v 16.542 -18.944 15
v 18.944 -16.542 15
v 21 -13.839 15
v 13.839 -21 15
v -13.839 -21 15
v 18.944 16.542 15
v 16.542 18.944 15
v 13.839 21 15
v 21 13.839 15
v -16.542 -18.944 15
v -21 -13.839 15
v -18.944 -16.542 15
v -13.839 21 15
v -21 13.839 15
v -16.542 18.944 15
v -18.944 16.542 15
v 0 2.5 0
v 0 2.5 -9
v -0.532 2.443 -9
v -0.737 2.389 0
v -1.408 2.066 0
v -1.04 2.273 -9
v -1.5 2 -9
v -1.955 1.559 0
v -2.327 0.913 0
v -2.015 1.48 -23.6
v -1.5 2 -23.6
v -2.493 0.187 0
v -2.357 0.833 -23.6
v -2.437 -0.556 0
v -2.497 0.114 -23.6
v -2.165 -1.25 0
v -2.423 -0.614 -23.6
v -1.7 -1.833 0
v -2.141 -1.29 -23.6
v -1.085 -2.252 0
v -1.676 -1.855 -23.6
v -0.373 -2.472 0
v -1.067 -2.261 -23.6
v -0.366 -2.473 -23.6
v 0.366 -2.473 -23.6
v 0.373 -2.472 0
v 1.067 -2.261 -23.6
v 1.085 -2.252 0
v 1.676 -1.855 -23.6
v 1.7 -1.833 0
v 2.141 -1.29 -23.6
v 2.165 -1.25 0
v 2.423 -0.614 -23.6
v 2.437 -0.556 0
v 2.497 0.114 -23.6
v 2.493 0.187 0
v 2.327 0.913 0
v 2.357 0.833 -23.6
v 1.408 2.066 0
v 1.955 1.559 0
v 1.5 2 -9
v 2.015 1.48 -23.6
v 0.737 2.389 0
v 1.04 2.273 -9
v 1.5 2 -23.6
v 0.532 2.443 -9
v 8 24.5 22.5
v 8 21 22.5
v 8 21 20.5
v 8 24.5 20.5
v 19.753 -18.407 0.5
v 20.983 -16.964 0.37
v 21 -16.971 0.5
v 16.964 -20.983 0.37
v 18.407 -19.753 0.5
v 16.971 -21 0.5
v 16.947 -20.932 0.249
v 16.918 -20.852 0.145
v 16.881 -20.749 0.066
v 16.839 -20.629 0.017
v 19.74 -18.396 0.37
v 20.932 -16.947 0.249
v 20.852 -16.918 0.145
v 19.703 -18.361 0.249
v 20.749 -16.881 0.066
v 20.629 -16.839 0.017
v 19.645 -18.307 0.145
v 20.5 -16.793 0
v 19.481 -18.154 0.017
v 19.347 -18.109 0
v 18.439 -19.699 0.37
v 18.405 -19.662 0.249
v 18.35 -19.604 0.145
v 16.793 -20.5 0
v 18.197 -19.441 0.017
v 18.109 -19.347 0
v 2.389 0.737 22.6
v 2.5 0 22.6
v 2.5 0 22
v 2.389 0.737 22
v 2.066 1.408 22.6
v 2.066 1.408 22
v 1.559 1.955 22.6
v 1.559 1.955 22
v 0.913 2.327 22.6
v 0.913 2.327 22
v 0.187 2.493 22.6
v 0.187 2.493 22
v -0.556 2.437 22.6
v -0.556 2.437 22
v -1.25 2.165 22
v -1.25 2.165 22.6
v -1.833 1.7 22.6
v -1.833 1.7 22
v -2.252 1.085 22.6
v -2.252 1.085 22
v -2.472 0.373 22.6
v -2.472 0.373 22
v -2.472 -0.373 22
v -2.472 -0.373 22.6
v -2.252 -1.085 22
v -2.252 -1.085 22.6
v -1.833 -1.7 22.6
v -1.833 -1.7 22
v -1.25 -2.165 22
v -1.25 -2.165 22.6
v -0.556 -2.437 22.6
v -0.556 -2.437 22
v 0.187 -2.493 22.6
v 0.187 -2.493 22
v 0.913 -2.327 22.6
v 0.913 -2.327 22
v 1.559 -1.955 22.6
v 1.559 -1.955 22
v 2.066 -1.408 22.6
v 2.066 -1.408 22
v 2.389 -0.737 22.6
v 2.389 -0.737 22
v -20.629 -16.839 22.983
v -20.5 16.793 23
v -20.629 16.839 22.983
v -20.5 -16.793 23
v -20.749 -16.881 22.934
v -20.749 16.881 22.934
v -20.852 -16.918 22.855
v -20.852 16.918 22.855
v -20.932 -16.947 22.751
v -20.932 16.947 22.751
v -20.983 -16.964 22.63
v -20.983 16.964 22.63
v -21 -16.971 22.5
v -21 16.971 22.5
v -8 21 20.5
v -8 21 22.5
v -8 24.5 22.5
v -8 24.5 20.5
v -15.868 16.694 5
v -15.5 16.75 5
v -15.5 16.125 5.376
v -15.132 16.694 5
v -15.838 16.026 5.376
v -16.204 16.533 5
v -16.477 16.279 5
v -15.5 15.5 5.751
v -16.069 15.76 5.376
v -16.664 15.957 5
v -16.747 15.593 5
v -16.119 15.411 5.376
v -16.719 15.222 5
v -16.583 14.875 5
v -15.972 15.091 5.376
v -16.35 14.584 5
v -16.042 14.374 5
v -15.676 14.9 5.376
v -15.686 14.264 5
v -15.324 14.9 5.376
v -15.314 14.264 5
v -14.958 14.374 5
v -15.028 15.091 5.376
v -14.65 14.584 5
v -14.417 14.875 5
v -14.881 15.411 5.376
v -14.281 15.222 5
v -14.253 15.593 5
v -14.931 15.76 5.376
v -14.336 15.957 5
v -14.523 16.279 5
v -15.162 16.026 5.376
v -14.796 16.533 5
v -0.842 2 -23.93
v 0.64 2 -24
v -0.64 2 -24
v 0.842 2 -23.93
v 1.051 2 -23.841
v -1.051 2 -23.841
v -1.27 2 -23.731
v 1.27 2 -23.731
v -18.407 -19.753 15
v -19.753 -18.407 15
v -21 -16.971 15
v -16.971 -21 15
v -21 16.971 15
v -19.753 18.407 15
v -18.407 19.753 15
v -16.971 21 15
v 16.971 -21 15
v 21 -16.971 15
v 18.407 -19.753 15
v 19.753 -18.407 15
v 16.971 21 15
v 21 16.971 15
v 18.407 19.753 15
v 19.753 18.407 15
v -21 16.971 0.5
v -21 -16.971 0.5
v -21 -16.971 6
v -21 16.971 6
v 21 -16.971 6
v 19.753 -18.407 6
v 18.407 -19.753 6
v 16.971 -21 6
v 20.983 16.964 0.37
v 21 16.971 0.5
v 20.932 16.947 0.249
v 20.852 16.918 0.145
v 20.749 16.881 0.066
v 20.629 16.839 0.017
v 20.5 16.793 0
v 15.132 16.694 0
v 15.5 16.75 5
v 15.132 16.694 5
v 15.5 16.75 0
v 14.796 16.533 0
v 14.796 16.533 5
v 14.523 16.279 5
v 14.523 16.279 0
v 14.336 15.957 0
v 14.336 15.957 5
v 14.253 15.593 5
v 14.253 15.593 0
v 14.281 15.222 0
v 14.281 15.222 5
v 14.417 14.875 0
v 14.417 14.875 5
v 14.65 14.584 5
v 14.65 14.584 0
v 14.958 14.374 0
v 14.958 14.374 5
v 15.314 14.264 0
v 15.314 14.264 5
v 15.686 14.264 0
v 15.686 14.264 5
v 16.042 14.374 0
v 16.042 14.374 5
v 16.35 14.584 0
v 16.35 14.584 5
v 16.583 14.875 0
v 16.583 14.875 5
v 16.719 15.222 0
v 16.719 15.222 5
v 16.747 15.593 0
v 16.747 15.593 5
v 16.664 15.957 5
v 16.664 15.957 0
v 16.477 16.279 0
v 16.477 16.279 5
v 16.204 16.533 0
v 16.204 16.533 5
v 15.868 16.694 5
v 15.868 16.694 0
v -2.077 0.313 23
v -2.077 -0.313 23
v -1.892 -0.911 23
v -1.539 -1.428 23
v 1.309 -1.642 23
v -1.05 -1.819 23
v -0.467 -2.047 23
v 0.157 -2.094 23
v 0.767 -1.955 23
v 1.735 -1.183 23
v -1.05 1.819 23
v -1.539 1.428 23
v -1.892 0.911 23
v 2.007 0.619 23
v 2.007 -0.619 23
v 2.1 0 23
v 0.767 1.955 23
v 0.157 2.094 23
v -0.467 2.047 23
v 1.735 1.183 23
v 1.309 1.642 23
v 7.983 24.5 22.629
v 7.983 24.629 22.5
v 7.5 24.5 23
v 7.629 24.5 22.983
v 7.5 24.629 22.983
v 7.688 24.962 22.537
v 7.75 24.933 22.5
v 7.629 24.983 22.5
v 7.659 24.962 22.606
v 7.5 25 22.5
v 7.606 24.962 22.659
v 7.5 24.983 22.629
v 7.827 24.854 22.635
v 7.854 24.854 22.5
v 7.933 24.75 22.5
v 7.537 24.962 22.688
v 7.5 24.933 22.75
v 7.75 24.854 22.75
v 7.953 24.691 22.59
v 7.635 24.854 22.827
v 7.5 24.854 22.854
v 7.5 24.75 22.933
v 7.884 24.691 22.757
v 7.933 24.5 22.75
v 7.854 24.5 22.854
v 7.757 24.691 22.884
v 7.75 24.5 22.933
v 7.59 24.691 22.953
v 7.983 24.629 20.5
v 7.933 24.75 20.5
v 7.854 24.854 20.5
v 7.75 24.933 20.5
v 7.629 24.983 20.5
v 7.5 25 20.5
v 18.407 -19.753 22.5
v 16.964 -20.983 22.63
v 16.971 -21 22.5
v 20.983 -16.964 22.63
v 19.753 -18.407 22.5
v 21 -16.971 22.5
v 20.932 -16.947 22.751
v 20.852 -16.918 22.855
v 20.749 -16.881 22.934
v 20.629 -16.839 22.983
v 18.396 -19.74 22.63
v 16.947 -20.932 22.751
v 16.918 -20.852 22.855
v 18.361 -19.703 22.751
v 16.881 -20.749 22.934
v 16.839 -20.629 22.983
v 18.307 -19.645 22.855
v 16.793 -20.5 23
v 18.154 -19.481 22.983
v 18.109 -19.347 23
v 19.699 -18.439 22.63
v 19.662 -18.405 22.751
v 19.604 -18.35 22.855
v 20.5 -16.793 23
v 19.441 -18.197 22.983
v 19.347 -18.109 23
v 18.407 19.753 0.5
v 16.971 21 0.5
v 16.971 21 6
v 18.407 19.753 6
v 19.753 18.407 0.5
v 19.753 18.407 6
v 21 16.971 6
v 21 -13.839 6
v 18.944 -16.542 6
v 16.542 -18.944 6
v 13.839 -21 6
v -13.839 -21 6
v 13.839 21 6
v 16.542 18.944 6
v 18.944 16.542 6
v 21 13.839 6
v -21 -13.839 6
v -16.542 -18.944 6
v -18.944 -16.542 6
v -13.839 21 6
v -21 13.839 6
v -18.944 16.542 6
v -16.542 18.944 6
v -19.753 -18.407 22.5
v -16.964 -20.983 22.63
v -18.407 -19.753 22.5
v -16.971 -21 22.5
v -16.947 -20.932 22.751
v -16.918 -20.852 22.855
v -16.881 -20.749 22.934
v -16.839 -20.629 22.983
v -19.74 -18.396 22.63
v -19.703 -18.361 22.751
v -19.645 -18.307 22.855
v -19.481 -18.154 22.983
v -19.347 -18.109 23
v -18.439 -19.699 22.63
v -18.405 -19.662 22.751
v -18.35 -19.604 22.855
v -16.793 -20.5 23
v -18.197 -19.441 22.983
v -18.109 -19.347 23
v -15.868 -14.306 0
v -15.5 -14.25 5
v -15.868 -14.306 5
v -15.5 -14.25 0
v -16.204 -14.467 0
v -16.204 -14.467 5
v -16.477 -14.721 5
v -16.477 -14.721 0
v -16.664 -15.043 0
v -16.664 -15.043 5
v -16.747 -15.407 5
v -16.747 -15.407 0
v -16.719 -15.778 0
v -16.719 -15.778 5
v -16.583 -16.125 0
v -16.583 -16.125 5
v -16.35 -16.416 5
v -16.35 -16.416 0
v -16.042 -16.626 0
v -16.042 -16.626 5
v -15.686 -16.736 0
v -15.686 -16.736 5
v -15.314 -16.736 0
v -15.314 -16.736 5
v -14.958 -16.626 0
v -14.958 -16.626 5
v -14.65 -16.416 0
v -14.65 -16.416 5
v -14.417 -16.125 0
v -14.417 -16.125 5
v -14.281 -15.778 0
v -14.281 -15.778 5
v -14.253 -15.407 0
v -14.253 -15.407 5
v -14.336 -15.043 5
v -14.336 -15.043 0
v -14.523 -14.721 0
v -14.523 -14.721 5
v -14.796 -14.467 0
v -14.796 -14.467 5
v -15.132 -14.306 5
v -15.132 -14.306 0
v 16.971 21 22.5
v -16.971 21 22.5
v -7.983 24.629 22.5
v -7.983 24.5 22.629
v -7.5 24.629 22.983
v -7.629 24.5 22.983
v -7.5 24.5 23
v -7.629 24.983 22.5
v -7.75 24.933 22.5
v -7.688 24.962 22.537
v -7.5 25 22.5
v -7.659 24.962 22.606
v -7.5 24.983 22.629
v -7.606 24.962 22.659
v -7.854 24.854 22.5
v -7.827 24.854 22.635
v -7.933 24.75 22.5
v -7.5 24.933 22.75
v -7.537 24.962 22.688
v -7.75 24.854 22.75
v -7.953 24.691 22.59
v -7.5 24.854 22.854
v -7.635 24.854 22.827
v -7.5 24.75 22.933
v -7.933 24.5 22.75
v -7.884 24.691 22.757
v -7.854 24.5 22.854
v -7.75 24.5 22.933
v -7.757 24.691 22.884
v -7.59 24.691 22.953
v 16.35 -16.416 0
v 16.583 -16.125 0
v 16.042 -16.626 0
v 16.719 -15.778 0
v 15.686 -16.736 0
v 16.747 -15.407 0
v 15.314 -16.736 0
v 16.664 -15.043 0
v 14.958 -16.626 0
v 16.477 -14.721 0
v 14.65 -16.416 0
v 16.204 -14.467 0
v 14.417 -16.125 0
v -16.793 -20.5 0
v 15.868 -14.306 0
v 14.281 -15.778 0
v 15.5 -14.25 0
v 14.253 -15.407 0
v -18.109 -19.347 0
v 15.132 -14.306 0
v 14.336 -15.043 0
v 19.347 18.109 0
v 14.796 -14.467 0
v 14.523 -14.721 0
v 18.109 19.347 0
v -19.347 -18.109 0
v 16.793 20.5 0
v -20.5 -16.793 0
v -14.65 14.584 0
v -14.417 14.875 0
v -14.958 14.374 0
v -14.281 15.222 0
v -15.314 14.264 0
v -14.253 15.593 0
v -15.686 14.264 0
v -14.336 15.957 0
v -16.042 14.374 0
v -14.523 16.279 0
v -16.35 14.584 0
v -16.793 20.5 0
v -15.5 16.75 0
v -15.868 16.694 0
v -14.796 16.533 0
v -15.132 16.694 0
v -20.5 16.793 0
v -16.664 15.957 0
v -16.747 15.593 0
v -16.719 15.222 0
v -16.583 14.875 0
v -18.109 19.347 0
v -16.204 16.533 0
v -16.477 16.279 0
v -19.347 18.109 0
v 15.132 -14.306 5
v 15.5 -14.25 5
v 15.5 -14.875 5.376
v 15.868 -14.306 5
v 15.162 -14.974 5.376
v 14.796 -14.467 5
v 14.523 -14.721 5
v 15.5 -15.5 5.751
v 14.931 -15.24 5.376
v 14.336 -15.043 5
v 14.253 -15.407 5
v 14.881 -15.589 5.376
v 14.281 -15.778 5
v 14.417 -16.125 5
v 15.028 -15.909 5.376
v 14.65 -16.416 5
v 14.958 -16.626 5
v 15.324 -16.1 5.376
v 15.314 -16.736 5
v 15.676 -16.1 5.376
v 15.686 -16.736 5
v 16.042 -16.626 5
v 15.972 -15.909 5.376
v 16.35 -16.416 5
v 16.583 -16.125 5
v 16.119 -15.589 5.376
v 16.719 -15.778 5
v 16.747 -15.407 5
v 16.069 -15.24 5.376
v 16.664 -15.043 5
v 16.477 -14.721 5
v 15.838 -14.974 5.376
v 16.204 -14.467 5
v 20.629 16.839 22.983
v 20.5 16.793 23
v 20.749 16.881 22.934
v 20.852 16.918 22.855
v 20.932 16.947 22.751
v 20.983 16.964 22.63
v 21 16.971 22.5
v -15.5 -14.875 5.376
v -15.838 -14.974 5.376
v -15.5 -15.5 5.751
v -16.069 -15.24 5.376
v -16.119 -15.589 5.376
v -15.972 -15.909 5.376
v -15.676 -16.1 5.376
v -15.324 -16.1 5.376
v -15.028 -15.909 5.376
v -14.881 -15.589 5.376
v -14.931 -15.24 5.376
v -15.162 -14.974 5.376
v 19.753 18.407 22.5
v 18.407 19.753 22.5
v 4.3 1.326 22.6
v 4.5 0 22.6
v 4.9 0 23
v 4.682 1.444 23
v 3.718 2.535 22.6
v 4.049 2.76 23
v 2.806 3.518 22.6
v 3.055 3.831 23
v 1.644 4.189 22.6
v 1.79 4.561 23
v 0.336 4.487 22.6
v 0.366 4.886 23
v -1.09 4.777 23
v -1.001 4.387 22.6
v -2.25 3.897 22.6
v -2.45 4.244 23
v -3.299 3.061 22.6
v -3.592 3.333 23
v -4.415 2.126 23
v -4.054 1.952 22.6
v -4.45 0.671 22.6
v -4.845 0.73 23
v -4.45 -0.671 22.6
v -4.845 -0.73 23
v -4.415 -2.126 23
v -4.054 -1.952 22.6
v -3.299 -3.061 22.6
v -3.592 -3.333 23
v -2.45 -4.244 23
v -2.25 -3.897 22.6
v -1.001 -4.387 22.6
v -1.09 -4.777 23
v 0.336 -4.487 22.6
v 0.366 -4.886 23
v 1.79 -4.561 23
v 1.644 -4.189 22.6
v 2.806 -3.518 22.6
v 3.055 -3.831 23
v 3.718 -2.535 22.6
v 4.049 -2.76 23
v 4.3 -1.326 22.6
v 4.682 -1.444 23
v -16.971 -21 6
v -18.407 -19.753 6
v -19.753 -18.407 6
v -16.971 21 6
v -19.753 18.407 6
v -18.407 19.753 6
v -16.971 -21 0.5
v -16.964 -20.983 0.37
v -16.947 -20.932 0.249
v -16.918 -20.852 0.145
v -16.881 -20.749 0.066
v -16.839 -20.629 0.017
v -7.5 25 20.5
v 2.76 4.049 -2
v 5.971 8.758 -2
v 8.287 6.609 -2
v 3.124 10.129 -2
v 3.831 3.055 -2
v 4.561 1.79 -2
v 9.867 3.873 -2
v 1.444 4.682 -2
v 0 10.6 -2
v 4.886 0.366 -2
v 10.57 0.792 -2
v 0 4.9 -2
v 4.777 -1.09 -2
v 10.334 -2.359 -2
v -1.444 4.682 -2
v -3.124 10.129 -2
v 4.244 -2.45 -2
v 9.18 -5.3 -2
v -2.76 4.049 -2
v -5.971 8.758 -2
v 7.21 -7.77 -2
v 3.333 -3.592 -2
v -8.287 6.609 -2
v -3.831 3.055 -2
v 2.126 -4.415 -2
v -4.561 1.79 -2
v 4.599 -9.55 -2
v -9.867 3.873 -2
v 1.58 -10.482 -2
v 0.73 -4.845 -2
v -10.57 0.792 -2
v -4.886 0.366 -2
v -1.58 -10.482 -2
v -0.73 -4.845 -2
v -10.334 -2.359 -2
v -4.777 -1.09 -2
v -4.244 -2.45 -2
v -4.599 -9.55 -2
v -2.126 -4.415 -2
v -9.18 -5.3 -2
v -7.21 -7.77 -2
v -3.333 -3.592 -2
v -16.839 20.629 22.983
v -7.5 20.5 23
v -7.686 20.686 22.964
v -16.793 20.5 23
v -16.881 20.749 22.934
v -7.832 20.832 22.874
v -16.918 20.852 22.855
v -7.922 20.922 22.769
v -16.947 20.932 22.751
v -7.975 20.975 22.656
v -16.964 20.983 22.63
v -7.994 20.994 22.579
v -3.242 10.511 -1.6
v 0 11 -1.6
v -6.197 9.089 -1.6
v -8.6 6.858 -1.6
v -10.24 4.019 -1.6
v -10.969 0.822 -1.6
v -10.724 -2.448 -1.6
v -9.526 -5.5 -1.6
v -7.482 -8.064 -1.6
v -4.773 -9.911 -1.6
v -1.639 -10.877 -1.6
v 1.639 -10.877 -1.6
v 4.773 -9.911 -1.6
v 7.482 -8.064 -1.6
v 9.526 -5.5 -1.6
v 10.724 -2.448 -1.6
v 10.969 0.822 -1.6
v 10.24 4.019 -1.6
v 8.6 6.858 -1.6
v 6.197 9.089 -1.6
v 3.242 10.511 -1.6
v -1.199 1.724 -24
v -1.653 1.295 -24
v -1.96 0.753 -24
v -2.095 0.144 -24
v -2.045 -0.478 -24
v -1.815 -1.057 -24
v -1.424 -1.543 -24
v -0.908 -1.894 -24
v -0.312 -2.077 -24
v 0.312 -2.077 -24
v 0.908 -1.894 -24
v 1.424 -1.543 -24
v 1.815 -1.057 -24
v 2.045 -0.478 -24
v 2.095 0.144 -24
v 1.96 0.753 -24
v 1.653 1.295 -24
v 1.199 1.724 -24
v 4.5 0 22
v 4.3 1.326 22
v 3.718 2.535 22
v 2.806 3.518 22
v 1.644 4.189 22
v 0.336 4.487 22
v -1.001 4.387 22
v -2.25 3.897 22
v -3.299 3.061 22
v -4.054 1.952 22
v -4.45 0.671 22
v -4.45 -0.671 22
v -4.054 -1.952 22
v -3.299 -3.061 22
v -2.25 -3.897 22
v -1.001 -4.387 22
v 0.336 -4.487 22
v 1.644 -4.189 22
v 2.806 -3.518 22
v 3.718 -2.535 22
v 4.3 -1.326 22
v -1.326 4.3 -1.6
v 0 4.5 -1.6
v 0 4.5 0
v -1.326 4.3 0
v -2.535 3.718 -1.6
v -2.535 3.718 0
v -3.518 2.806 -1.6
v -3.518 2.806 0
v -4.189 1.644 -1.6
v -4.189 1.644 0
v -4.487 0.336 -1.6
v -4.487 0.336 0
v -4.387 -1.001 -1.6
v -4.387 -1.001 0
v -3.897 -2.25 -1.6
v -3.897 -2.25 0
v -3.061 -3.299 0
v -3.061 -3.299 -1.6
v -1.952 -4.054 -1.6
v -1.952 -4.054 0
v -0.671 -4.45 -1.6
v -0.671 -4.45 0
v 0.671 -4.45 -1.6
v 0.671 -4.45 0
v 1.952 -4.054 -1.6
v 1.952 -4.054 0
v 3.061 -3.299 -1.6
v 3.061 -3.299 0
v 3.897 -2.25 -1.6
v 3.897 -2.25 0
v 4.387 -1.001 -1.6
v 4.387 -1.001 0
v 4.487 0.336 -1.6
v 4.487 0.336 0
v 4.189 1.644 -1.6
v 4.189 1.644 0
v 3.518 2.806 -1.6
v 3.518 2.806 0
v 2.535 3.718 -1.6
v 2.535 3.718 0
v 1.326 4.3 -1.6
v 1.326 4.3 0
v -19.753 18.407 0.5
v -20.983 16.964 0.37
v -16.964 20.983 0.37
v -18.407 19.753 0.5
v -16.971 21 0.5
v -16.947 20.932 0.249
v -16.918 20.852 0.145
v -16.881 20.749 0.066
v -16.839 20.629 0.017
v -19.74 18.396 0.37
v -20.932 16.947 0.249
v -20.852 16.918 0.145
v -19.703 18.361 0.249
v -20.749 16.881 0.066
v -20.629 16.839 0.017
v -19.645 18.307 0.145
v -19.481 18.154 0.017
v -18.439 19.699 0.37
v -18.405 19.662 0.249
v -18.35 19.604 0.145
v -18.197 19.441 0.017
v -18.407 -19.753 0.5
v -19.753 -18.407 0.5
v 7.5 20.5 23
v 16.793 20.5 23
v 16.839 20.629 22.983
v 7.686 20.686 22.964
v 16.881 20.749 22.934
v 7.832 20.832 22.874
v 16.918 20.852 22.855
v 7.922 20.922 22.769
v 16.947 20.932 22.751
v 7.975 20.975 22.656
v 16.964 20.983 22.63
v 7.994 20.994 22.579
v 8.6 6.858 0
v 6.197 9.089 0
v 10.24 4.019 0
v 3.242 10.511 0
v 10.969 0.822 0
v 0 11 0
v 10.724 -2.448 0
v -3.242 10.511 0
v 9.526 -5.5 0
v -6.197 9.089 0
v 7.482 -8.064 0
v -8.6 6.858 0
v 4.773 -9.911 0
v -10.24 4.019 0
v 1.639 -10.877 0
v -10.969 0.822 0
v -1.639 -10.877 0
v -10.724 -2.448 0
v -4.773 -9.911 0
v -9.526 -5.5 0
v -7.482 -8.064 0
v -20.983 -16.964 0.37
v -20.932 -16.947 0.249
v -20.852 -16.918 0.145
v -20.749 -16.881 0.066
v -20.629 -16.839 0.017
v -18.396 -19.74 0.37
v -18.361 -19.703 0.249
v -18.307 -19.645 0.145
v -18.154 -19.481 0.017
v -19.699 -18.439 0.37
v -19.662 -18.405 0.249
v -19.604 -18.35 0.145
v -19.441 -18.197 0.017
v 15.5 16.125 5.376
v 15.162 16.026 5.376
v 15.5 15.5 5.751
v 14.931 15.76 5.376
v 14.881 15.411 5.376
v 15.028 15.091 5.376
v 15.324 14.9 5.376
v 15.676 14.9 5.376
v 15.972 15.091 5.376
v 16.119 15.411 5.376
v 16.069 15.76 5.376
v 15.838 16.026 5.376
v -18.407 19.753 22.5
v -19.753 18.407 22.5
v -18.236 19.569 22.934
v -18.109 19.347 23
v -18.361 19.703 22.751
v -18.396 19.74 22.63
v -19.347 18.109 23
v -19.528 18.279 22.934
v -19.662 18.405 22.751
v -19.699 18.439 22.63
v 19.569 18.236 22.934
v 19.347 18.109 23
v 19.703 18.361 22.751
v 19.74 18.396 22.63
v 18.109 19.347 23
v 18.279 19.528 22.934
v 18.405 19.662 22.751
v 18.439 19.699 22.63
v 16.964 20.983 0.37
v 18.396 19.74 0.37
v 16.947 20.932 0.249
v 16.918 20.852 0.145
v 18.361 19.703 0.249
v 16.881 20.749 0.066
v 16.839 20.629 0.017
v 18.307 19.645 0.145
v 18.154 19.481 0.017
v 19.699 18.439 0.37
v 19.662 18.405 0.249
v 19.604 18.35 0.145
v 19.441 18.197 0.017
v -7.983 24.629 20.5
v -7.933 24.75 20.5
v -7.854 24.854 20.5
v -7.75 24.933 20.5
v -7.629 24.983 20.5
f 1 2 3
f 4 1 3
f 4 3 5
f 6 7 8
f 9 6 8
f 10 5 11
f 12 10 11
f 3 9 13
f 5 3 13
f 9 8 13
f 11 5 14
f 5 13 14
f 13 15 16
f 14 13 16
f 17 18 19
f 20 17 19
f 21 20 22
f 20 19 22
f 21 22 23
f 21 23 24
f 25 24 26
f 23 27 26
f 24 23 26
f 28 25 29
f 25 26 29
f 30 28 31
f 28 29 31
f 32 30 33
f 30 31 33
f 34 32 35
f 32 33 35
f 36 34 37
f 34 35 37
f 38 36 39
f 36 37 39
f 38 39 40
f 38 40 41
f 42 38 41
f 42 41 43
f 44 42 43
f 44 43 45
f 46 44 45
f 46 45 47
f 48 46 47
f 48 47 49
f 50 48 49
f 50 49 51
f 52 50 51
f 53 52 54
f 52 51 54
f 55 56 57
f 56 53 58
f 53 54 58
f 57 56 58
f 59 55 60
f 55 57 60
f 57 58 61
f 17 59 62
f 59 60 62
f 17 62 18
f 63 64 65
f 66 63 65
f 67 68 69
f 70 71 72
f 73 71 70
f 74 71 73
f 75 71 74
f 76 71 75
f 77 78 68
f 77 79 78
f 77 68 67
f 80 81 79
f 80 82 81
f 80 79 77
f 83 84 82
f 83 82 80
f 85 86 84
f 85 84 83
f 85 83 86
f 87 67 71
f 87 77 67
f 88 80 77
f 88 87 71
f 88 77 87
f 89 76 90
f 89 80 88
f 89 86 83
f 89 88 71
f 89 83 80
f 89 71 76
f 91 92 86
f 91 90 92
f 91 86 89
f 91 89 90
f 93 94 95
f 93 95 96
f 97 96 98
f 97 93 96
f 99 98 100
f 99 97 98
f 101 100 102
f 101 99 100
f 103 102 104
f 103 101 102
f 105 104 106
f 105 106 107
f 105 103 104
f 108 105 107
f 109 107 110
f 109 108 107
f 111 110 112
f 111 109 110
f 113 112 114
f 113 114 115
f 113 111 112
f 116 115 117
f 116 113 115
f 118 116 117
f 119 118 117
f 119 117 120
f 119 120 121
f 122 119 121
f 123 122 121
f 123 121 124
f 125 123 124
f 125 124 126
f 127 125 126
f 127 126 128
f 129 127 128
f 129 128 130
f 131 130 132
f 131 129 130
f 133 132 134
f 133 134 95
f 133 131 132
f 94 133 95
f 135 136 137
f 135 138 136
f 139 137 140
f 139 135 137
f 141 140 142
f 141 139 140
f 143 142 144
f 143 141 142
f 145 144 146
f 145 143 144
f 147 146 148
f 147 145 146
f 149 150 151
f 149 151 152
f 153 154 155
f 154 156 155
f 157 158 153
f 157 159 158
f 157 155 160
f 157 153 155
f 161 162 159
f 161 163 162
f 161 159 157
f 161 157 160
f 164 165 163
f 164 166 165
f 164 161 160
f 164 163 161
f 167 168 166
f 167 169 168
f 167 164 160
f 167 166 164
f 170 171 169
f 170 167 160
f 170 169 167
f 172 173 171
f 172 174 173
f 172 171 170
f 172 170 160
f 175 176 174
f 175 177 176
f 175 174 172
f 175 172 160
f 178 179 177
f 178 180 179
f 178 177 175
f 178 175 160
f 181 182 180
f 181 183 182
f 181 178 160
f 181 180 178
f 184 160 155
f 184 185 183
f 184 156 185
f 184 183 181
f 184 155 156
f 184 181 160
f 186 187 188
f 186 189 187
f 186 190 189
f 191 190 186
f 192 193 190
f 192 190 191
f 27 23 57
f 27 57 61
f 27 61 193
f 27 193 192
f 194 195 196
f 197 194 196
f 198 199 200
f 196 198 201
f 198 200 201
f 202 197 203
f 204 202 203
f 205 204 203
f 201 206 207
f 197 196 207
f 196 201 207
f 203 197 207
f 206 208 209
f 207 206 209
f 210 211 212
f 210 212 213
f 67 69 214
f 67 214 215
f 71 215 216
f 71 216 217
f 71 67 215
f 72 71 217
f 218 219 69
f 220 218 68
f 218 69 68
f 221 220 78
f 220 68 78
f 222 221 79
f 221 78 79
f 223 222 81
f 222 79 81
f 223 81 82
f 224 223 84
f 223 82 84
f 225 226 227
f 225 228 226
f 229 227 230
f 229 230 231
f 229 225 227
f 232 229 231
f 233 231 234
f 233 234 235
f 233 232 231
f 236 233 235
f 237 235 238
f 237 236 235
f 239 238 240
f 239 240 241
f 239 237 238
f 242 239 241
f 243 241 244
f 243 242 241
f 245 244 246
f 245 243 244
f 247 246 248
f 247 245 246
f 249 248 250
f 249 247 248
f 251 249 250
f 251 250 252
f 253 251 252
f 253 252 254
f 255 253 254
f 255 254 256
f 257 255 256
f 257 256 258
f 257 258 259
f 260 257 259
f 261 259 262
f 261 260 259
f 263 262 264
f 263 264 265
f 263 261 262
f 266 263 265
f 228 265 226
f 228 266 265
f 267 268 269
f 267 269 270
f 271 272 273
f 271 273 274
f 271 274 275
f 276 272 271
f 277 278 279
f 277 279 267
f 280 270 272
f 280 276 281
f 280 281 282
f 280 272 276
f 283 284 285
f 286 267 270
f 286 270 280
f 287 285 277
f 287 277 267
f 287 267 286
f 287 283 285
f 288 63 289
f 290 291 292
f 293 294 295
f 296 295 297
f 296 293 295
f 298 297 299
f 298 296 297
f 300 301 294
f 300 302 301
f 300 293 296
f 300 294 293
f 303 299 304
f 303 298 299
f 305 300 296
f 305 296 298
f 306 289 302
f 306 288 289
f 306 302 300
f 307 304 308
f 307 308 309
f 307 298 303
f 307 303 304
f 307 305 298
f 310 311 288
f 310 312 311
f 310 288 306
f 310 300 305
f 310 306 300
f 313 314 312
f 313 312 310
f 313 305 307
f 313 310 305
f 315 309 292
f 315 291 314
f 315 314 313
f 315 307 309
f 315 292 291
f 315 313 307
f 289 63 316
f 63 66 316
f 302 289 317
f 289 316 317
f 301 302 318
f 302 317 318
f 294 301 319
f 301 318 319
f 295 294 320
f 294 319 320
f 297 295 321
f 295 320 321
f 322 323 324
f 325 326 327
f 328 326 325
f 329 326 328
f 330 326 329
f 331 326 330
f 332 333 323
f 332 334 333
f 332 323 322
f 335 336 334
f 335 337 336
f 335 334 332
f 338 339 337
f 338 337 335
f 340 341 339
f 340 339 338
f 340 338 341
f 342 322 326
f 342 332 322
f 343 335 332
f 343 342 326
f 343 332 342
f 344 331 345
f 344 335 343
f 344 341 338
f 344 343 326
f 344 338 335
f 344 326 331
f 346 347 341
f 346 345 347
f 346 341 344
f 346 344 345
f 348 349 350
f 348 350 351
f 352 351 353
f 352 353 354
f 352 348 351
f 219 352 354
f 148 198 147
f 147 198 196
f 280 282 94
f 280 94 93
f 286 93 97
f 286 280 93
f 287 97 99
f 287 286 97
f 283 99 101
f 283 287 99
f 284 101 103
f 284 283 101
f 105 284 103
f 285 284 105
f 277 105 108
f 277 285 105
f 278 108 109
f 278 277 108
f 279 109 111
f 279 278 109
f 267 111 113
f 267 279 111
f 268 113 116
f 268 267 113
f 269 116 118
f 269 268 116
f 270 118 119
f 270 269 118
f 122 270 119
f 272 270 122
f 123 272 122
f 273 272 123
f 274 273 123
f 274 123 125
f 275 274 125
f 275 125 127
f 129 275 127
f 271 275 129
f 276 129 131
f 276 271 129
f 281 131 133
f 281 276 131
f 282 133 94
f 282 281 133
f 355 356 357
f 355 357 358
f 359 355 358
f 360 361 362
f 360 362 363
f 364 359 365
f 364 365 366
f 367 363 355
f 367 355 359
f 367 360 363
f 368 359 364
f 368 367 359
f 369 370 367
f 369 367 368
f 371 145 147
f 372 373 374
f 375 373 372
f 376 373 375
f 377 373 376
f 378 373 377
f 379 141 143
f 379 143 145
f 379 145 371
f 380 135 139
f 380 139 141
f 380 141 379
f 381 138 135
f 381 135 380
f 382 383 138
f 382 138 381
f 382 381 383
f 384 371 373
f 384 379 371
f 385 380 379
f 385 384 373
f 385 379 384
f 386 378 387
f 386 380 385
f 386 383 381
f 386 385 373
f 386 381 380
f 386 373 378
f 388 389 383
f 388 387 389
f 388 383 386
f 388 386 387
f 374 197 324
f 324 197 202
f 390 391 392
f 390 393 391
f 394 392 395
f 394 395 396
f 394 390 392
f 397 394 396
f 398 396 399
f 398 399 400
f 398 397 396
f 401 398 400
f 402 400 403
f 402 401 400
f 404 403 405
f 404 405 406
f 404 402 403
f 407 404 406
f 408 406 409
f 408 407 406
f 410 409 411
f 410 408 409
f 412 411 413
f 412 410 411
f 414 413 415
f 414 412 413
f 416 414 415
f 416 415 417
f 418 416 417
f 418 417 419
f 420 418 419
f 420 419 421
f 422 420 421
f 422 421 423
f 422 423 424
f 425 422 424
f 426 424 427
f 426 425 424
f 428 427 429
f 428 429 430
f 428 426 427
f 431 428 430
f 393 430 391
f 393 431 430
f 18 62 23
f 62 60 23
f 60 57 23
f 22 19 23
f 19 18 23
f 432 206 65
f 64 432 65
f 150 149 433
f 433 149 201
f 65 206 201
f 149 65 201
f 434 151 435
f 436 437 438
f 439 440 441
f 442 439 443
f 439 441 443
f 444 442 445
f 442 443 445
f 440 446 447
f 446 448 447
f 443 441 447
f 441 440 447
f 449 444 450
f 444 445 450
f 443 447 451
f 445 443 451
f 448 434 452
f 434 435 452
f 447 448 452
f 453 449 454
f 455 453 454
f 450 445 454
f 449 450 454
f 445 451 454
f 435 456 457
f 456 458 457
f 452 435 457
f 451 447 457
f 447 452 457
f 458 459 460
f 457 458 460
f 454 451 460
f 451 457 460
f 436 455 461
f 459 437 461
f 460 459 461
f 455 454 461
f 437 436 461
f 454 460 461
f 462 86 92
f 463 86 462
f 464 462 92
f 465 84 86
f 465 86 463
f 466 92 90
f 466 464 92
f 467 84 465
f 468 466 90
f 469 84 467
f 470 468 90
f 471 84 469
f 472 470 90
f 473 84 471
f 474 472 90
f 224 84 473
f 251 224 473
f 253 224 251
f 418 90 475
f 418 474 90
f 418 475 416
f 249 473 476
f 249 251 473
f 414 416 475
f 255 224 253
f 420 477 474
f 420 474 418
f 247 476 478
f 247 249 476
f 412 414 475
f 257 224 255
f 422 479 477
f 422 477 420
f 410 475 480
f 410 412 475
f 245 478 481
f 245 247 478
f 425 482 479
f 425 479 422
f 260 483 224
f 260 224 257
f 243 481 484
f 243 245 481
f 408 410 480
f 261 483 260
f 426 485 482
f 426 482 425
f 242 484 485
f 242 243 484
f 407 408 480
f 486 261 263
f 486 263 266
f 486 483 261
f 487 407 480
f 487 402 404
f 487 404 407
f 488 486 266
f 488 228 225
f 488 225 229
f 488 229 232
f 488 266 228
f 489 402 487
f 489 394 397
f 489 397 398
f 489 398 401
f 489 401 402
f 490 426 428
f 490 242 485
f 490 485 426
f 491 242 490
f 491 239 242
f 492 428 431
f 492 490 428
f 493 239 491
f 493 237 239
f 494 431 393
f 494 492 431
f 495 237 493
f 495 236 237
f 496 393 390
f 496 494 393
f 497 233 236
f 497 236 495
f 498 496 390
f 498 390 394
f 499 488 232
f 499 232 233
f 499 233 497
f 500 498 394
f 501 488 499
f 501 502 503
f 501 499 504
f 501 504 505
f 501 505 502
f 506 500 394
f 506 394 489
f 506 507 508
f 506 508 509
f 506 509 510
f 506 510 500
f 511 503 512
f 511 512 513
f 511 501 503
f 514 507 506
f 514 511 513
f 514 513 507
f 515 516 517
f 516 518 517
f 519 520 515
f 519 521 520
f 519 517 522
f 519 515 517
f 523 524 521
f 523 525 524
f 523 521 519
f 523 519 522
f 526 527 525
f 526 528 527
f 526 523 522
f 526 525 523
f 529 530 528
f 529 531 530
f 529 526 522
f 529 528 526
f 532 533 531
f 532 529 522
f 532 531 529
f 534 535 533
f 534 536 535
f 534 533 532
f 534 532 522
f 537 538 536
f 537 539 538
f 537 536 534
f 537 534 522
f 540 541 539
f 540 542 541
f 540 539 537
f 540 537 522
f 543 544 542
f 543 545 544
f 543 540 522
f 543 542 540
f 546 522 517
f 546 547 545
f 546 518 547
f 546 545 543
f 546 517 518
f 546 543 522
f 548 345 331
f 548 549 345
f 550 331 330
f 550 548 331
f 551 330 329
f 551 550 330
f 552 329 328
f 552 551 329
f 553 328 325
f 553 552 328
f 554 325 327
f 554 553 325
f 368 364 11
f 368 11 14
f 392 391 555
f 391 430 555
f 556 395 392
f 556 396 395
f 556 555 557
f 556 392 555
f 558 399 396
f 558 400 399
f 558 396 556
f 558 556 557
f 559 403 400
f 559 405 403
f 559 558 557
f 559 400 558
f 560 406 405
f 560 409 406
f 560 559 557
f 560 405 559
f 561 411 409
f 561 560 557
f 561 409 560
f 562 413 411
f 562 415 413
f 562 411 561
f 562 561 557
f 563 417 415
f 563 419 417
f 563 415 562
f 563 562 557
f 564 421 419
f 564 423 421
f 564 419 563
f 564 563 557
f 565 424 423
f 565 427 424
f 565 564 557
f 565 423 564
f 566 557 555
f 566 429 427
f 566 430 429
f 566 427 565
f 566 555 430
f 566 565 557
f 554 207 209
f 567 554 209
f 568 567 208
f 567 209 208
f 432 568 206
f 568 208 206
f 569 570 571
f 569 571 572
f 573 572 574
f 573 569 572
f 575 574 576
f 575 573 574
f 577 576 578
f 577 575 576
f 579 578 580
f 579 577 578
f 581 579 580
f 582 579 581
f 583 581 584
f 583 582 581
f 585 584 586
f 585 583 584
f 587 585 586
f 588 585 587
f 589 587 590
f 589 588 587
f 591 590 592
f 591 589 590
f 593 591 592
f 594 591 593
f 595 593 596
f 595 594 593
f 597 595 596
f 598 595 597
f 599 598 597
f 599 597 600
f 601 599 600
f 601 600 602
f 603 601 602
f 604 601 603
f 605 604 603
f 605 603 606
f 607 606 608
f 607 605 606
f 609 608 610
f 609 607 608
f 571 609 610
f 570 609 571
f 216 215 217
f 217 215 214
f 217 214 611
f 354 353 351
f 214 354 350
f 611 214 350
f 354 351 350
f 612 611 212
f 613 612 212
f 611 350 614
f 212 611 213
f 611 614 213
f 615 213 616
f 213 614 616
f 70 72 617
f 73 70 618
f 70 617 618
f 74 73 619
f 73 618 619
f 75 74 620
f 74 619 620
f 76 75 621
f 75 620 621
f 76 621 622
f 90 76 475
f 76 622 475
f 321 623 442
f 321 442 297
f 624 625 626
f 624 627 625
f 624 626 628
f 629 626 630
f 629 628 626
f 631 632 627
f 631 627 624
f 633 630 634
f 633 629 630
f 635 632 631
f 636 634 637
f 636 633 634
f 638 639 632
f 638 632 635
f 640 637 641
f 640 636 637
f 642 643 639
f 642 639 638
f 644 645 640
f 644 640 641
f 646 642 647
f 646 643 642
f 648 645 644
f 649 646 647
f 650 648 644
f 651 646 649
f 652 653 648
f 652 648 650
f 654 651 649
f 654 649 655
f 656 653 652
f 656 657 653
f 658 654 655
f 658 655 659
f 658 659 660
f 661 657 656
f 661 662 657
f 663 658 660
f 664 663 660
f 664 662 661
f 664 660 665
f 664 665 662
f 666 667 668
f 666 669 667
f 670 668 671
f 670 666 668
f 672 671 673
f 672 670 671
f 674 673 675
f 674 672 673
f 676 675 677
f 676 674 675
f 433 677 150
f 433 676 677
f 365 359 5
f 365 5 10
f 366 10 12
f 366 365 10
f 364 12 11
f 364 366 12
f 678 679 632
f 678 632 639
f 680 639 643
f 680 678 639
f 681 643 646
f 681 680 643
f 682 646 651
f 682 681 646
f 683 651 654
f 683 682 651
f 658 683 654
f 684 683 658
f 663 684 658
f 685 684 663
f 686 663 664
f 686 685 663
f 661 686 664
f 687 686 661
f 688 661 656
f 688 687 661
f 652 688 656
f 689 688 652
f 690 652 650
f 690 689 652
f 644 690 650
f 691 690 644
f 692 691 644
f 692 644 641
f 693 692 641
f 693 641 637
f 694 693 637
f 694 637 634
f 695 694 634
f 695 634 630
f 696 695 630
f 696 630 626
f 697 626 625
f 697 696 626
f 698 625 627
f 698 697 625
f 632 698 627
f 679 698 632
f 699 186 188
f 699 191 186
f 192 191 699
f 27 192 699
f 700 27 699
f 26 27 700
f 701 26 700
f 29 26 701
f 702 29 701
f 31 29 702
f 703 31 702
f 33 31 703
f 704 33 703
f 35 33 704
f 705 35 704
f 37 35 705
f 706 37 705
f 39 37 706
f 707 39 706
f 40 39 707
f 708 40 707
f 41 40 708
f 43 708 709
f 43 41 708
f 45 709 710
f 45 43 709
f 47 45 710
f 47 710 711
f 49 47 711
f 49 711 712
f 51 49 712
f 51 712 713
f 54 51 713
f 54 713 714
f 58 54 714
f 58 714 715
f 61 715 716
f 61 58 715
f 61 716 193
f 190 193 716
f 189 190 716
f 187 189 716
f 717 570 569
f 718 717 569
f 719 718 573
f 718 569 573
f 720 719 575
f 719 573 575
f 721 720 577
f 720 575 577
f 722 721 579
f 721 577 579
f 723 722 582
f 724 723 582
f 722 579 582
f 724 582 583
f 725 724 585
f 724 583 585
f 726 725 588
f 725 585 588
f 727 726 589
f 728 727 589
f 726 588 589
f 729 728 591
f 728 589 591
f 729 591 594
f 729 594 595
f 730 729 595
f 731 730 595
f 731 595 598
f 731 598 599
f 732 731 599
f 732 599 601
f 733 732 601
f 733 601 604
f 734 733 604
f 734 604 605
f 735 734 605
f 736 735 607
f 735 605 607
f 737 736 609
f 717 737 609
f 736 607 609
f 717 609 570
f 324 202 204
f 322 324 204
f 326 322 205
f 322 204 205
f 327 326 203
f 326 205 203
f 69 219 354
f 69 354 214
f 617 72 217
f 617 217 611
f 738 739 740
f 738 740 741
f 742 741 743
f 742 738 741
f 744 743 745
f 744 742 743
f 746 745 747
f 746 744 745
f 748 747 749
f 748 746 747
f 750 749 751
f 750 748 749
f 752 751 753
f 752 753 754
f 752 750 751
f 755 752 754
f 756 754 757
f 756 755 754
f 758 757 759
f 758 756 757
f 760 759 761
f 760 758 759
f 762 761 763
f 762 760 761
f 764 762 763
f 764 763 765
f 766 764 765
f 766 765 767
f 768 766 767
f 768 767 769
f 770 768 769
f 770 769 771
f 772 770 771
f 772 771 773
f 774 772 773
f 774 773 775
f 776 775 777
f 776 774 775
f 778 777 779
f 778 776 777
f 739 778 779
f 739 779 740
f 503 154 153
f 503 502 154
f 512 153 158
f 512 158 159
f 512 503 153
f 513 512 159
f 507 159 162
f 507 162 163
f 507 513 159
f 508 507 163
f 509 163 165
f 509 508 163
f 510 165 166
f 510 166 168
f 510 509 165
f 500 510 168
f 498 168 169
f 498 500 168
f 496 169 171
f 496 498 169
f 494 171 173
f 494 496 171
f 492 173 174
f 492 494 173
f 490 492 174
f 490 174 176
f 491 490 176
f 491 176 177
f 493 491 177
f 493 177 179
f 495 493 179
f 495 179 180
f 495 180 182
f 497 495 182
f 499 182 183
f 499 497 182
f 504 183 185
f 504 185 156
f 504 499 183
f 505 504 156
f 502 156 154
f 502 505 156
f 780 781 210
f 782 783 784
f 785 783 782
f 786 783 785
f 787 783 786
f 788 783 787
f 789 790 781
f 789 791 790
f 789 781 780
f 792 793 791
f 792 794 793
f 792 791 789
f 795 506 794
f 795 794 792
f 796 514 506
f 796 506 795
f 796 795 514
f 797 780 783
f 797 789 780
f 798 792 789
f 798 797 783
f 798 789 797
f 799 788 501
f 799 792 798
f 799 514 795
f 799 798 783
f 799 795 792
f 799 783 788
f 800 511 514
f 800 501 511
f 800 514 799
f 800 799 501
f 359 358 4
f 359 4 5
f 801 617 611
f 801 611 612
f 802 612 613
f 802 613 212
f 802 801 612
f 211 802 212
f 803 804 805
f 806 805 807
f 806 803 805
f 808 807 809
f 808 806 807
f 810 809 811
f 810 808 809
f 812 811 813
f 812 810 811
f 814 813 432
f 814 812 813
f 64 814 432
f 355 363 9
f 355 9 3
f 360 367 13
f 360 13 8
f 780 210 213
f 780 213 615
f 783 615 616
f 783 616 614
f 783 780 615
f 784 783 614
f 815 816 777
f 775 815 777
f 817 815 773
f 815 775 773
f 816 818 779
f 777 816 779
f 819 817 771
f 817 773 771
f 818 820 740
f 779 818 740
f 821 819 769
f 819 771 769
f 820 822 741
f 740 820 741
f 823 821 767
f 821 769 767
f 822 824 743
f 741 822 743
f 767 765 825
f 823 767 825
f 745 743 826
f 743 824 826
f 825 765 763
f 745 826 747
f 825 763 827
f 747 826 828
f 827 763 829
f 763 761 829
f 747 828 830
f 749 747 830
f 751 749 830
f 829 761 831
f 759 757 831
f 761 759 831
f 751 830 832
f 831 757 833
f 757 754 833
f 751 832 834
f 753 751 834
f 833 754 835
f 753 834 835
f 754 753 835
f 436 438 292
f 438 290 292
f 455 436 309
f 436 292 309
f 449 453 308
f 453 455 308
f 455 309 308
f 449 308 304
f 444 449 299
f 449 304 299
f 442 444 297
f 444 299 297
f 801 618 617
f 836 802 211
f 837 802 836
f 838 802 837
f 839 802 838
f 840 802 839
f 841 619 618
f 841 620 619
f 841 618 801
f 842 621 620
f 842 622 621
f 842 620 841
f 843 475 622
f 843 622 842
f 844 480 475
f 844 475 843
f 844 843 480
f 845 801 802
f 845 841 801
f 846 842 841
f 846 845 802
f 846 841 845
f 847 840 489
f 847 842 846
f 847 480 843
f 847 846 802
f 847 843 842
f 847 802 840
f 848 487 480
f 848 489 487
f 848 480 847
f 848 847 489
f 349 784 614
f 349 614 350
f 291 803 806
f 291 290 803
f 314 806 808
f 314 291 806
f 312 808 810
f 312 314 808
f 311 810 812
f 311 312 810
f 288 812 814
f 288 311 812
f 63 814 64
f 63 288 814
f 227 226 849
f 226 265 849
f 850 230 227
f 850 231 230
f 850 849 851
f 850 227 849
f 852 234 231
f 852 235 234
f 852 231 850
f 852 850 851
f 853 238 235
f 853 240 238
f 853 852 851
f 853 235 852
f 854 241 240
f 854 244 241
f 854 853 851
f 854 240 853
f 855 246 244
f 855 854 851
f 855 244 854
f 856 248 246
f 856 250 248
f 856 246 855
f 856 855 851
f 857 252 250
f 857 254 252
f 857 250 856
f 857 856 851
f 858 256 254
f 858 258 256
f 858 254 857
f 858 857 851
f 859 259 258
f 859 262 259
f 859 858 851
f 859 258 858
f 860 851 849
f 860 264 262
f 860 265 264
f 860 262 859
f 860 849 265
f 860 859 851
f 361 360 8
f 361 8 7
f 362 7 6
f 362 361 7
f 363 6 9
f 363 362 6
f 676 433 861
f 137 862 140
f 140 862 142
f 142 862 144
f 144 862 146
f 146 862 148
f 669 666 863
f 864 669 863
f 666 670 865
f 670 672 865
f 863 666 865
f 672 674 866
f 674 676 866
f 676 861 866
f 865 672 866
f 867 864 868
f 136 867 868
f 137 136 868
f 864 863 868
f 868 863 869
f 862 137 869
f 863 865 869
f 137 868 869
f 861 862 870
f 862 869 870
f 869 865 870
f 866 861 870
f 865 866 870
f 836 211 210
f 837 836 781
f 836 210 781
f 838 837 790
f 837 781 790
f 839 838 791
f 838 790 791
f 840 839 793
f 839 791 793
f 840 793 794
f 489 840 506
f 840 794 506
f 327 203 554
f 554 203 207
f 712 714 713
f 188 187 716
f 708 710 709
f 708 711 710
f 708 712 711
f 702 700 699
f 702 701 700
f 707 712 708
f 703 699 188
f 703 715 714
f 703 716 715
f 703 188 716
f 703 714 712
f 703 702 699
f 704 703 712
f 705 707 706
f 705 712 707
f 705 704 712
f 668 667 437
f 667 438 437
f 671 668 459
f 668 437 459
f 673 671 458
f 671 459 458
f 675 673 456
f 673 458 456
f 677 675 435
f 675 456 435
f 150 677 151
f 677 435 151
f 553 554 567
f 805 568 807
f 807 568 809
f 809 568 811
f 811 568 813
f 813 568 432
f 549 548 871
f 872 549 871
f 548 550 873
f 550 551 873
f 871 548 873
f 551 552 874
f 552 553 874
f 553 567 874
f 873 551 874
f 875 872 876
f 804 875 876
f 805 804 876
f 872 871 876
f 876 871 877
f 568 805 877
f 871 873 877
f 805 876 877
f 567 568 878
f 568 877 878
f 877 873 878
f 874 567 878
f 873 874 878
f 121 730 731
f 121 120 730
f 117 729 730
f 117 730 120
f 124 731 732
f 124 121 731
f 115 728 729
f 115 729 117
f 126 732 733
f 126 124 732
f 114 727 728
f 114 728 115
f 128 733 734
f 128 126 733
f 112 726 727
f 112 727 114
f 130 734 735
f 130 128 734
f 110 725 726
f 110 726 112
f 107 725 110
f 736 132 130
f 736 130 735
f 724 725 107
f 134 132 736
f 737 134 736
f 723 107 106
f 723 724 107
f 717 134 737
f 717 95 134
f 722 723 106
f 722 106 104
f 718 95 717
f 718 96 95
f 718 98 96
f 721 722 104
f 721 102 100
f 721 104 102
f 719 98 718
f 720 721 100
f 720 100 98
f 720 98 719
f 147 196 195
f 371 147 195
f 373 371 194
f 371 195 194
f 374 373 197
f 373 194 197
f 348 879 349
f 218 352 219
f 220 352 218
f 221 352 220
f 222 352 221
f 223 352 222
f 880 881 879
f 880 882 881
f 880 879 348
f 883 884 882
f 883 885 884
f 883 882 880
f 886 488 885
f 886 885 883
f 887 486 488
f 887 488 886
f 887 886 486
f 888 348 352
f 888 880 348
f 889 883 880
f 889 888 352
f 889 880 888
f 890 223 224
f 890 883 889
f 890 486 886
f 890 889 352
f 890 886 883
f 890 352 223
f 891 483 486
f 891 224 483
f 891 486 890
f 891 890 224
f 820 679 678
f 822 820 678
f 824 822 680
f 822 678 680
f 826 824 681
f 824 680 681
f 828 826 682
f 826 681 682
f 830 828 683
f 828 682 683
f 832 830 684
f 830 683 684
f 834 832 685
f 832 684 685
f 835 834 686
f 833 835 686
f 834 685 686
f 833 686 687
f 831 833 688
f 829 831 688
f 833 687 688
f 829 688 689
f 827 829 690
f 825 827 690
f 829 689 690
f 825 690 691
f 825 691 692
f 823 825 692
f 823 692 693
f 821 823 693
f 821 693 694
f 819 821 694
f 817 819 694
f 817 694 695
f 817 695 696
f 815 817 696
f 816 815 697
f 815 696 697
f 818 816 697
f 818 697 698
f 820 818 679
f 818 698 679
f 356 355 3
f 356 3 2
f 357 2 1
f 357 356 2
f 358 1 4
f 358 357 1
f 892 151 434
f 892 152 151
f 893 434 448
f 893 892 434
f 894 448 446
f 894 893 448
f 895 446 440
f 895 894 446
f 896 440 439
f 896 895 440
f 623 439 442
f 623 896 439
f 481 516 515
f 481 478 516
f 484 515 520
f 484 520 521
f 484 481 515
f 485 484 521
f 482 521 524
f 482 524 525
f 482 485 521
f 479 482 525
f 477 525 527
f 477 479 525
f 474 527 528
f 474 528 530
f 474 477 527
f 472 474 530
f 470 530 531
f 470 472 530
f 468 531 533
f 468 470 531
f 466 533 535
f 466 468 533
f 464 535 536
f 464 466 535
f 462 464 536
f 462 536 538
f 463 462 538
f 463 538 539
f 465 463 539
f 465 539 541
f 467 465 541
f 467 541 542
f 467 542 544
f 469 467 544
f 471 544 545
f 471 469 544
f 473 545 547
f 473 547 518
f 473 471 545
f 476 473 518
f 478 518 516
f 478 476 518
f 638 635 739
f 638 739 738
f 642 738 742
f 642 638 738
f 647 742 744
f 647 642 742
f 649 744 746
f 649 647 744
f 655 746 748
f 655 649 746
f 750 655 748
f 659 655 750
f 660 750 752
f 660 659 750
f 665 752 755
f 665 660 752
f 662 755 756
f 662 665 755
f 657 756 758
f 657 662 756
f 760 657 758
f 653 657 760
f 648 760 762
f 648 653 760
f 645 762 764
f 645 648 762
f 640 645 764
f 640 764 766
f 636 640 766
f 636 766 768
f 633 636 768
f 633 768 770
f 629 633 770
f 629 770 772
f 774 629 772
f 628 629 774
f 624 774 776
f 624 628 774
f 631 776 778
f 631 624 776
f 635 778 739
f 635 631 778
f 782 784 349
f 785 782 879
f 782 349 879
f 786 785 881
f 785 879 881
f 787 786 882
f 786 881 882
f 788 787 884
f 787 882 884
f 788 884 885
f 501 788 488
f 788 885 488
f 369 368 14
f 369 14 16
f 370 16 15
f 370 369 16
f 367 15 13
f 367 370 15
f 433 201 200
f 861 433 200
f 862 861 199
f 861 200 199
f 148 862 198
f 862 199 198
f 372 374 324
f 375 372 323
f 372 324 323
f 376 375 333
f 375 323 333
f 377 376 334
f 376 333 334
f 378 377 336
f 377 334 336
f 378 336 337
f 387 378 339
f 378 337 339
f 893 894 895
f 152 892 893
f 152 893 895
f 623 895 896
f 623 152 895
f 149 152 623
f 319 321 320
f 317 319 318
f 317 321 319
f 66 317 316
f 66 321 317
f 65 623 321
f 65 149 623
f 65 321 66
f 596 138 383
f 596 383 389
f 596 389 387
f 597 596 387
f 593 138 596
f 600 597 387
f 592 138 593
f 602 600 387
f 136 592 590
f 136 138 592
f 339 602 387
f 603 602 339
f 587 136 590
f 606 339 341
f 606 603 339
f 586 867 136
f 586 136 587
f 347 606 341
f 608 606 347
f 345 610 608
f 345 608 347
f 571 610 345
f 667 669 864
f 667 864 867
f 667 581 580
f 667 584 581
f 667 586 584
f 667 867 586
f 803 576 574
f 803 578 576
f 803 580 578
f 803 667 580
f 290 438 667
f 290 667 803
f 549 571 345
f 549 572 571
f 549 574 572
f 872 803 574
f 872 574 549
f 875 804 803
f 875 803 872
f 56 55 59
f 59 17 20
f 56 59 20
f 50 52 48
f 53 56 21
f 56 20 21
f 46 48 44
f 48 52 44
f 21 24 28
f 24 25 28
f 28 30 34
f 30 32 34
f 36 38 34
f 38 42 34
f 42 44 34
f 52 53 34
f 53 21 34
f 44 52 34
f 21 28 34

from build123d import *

# Parameters (mm, degrees)
BOSS_EXTRU_1_DEPTH           = 6
BOSS_EXTRU_2_DEPTH           = 9
BOSS_EXTRU_3_DEPTH           = 8
ESQUISSE4_W                  = 16
ESQUISSE4_H                  = 2.5
BOSS_EXTRU_4_DEPTH           = 4
ESQUISSE5_W                  = 2
ESQUISSE5_H                  = 6.5
ESQUISSE5_W_2                = 24
ESQUISSE5_H_2                = 2.5
CONG_1_R                     = 0.5
CONG_2_R                     = 0.5
CHANFREIN1_SIZE              = 0.4
CHANFREIN2_SIZE              = 0.4
ESQUISSE6_W                  = 15
ESQUISSE6_H                  = 0.5
ENL_V_MAT_EXTRU_1_DEPTH      = 22.0000001
ENL_V_MAT_EXTRU_1_DEPTH_BACK = 22.0000001
ESQUISSE7_R                  = 4.5
ESQUISSE7_R_2                = 2.5
ENL_V_MAT_EXTRU_2_DEPTH      = 1
CHANFREIN3_SIZE              = 0.4
TROU_TARAUD_M31_AT_2_COUNT   = 2
TROU_TARAUD_M31_AT_2_PITCH   = 31
TROU_TARAUD_M31_AT_3_COUNT   = 2
TROU_TARAUD_M31_AT_3_PITCH   = 43.840620434
TROU_TARAUD_M31_AT_4_COUNT   = 2
TROU_TARAUD_M31_AT_4_PITCH   = 31


with BuildPart() as part:
    # Esquisse1 → Boss.-Extru.1 (new body)
    with BuildSketch(Plane.XY):
        with BuildLine():
            Line((21, 16.970562748), (21, -16.970562748))
            ThreePointArc((21, -16.970562748), (19.091883092, -19.091883092), (16.970562748, -21))
            Line((16.970562748, -21), (-16.970562748, -21))
            ThreePointArc((-16.970562748, -21), (-19.091883092, -19.091883092), (-21, -16.970562748))
            Line((-21, -16.970562748), (-21, 16.970562748))
            ThreePointArc((-21, 16.970562748), (-19.091883092, 19.091883092), (-16.970562748, 21))
            Line((-16.970562748, 21), (16.970562748, 21))
            ThreePointArc((16.970562748, 21), (19.091883092, 19.091883092), (21, 16.970562748))
        make_face()
    extrude(amount=BOSS_EXTRU_1_DEPTH)

    # Congé2
    cong_2_edges = [part.edges().sort_by_distance(p)[0] for p in [
        (0, 21, 0),
        (19.091883092, 19.091883092, 0),
        (21, 0, 0),
        (19.091883092, -19.091883092, 0),
        (0, -21, 0),
        (-19.091883092, -19.091883092, 0),
        (-21, 0, 0),
        (-19.091883092, 19.091883092, 0),
    ]]
    fillet(cong_2_edges, radius=CONG_2_R)

    # Esquisse9 → Trou taraudé M31 (revolve, cut)
    with BuildSketch(Plane(origin=(15.5, -15.5, 0), x_dir=(0, 1, 0), z_dir=(1, 0, 0))):
        Polygon((0, 0), (0, 5.751075774), (1.25, 5), (1.25, 0), align=None)
    trou_taraud_m31 = revolve(axis=Axis((15.5, -15.5, -6.35), (0, 0, 1)), mode=Mode.SUBTRACT)

    # Trou taraudé M31 at 2: Trou taraudé M31 ×2
    with Locations(*[(0, i * TROU_TARAUD_M31_AT_2_PITCH, 0) for i in range(1, TROU_TARAUD_M31_AT_2_COUNT)]):
        add(trou_taraud_m31, mode=Mode.SUBTRACT)

    # Trou taraudé M31 at 3: Trou taraudé M31 ×2
    with Locations(*[Vector(-0.707106781, 0.707106781, 0) * (i * TROU_TARAUD_M31_AT_3_PITCH) for i in range(1, TROU_TARAUD_M31_AT_3_COUNT)]):
        add(trou_taraud_m31, mode=Mode.SUBTRACT)

    # Trou taraudé M31 at 4: Trou taraudé M31 ×2
    with Locations(*[(-i * TROU_TARAUD_M31_AT_4_PITCH, 0, 0) for i in range(1, TROU_TARAUD_M31_AT_4_COUNT)]):
        add(trou_taraud_m31, mode=Mode.SUBTRACT)


with BuildPart() as body_2:
    # Esquisse2 → Boss.-Extru.2 (new body)
    with BuildSketch(Plane.XY.offset(6)):
        with BuildLine():
            Line((-13.839165437, 21), (13.839165437, 21))
            ThreePointArc((13.839165437, 21), (17.783735547, 17.783735547), (21, 13.839165437))
            Line((21, 13.839165437), (21, -13.839165437))
            ThreePointArc((21, -13.839165437), (17.783735547, -17.783735547), (13.839165437, -21))
            Line((13.839165437, -21), (-13.839165437, -21))
            ThreePointArc((-13.839165437, -21), (-17.783735547, -17.783735547), (-21, -13.839165437))
            Line((-21, -13.839165437), (-21, 13.839165437))
            ThreePointArc((-21, 13.839165437), (-17.783735547, 17.783735547), (-13.839165437, 21))
        make_face()
    extrude(amount=BOSS_EXTRU_2_DEPTH)


with BuildPart() as body_3:
    # Esquisse3 → Boss.-Extru.3 (new body)
    with BuildSketch(Plane.XY.offset(15)):
        with BuildLine():
            Line((-16.970562748, -21), (16.970562748, -21))
            ThreePointArc((16.970562748, -21), (19.091883092, -19.091883092), (21, -16.970562748))
            Line((21, -16.970562748), (21, 16.970562748))
            ThreePointArc((21, 16.970562748), (19.091883092, 19.091883092), (16.970562748, 21))
            Line((16.970562748, 21), (-16.970562748, 21))
            ThreePointArc((-16.970562748, 21), (-19.091883092, 19.091883092), (-21, 16.970562748))
            Line((-21, 16.970562748), (-21, -16.970562748))
            ThreePointArc((-21, -16.970562748), (-19.091883092, -19.091883092), (-16.970562748, -21))
        make_face()
    extrude(amount=BOSS_EXTRU_3_DEPTH)

    # Esquisse4 → Boss.-Extru.4 (add)
    with BuildSketch(Plane(origin=(0, 21, 0), x_dir=(1, 0, 0), z_dir=(0, 1, 0))):
        with Locations((0, -21.75)):
            Rectangle(ESQUISSE4_W, ESQUISSE4_H)
    extrude(amount=BOSS_EXTRU_4_DEPTH)

    # Congé1
    cong_1_edges = [body_3.edges().sort_by_distance(p)[0] for p in [
        (19.091883092, -19.091883092, 23),
        (21, 0, 23),
        (19.091883092, 19.091883092, 23),
        (12.485281374, 21, 23),
        (-19.091883092, 19.091883092, 23),
        (-21, 0, 23),
        (-12.485281374, 21, 23),
        (8, 23, 23),
        (-8, 23, 23),
        (8, 25, 21.75),
        (-8, 25, 21.75),
        (0, 25, 23),
        (-19.091883092, -19.091883092, 23),
        (0, -21, 23),
    ]]
    fillet(cong_1_edges, radius=CONG_1_R)

    # Esquisse7 → Enlèv. mat.-Extru.2 (cut)
    with BuildSketch(Plane.XY.offset(23)):
        Circle(ESQUISSE7_R)
        Circle(ESQUISSE7_R_2, mode=Mode.SUBTRACT)
    extrude(amount=-ENL_V_MAT_EXTRU_2_DEPTH, mode=Mode.SUBTRACT)

    # Chanfrein3
    chanfrein3_edges = [body_3.edges().sort_by_distance(p)[0] for p in [
        (-4.5, 0, 23),
        (-2.5, 0, 23),
    ]]
    chamfer(chanfrein3_edges, length=CHANFREIN3_SIZE)


with BuildPart() as body_4:
    # Esquisse5 → Révolution1 (revolve)
    with BuildSketch(Plane(origin=(0, 0, 0), x_dir=(0, 0, -1), z_dir=(1, 0, 0))):
        with Locations((1, 7.75)):
            Rectangle(ESQUISSE5_W, ESQUISSE5_H)
        with Locations((12, 1.25)):
            Rectangle(ESQUISSE5_W_2, ESQUISSE5_H_2)
    revolve(axis=Axis((0, 0, 0), (0, 0, 1)))

    # Chanfrein1
    chanfrein1_edges = [body_4.edges().sort_by_distance(p)[0] for p in [
        (0, -2.5, -24),
    ]]
    chamfer(chanfrein1_edges, length=CHANFREIN1_SIZE)

    # Chanfrein2
    chanfrein2_edges = [body_4.edges().sort_by_distance(p)[0] for p in [
        (0, -11, -2),
        (0, -4.5, -2),
    ]]
    chamfer(chanfrein2_edges, length=CHANFREIN2_SIZE)

    # Esquisse6 → Enlèv. mat.-Extru.1 (cut, two sides)
    with BuildSketch(Plane(origin=(0, 0, 0), x_dir=(0, 0, -1), z_dir=(1, 0, 0))) as enl_v_mat_extru_1_sk:
        with Locations((16.5, 2.25)):
            Rectangle(ESQUISSE6_W, ESQUISSE6_H)
    extrude(amount=ENL_V_MAT_EXTRU_1_DEPTH, mode=Mode.SUBTRACT)
    extrude(enl_v_mat_extru_1_sk.sketch, amount=-ENL_V_MAT_EXTRU_1_DEPTH_BACK, mode=Mode.SUBTRACT)


solid = Compound([part.part, body_2.part, body_3.part, body_4.part])
